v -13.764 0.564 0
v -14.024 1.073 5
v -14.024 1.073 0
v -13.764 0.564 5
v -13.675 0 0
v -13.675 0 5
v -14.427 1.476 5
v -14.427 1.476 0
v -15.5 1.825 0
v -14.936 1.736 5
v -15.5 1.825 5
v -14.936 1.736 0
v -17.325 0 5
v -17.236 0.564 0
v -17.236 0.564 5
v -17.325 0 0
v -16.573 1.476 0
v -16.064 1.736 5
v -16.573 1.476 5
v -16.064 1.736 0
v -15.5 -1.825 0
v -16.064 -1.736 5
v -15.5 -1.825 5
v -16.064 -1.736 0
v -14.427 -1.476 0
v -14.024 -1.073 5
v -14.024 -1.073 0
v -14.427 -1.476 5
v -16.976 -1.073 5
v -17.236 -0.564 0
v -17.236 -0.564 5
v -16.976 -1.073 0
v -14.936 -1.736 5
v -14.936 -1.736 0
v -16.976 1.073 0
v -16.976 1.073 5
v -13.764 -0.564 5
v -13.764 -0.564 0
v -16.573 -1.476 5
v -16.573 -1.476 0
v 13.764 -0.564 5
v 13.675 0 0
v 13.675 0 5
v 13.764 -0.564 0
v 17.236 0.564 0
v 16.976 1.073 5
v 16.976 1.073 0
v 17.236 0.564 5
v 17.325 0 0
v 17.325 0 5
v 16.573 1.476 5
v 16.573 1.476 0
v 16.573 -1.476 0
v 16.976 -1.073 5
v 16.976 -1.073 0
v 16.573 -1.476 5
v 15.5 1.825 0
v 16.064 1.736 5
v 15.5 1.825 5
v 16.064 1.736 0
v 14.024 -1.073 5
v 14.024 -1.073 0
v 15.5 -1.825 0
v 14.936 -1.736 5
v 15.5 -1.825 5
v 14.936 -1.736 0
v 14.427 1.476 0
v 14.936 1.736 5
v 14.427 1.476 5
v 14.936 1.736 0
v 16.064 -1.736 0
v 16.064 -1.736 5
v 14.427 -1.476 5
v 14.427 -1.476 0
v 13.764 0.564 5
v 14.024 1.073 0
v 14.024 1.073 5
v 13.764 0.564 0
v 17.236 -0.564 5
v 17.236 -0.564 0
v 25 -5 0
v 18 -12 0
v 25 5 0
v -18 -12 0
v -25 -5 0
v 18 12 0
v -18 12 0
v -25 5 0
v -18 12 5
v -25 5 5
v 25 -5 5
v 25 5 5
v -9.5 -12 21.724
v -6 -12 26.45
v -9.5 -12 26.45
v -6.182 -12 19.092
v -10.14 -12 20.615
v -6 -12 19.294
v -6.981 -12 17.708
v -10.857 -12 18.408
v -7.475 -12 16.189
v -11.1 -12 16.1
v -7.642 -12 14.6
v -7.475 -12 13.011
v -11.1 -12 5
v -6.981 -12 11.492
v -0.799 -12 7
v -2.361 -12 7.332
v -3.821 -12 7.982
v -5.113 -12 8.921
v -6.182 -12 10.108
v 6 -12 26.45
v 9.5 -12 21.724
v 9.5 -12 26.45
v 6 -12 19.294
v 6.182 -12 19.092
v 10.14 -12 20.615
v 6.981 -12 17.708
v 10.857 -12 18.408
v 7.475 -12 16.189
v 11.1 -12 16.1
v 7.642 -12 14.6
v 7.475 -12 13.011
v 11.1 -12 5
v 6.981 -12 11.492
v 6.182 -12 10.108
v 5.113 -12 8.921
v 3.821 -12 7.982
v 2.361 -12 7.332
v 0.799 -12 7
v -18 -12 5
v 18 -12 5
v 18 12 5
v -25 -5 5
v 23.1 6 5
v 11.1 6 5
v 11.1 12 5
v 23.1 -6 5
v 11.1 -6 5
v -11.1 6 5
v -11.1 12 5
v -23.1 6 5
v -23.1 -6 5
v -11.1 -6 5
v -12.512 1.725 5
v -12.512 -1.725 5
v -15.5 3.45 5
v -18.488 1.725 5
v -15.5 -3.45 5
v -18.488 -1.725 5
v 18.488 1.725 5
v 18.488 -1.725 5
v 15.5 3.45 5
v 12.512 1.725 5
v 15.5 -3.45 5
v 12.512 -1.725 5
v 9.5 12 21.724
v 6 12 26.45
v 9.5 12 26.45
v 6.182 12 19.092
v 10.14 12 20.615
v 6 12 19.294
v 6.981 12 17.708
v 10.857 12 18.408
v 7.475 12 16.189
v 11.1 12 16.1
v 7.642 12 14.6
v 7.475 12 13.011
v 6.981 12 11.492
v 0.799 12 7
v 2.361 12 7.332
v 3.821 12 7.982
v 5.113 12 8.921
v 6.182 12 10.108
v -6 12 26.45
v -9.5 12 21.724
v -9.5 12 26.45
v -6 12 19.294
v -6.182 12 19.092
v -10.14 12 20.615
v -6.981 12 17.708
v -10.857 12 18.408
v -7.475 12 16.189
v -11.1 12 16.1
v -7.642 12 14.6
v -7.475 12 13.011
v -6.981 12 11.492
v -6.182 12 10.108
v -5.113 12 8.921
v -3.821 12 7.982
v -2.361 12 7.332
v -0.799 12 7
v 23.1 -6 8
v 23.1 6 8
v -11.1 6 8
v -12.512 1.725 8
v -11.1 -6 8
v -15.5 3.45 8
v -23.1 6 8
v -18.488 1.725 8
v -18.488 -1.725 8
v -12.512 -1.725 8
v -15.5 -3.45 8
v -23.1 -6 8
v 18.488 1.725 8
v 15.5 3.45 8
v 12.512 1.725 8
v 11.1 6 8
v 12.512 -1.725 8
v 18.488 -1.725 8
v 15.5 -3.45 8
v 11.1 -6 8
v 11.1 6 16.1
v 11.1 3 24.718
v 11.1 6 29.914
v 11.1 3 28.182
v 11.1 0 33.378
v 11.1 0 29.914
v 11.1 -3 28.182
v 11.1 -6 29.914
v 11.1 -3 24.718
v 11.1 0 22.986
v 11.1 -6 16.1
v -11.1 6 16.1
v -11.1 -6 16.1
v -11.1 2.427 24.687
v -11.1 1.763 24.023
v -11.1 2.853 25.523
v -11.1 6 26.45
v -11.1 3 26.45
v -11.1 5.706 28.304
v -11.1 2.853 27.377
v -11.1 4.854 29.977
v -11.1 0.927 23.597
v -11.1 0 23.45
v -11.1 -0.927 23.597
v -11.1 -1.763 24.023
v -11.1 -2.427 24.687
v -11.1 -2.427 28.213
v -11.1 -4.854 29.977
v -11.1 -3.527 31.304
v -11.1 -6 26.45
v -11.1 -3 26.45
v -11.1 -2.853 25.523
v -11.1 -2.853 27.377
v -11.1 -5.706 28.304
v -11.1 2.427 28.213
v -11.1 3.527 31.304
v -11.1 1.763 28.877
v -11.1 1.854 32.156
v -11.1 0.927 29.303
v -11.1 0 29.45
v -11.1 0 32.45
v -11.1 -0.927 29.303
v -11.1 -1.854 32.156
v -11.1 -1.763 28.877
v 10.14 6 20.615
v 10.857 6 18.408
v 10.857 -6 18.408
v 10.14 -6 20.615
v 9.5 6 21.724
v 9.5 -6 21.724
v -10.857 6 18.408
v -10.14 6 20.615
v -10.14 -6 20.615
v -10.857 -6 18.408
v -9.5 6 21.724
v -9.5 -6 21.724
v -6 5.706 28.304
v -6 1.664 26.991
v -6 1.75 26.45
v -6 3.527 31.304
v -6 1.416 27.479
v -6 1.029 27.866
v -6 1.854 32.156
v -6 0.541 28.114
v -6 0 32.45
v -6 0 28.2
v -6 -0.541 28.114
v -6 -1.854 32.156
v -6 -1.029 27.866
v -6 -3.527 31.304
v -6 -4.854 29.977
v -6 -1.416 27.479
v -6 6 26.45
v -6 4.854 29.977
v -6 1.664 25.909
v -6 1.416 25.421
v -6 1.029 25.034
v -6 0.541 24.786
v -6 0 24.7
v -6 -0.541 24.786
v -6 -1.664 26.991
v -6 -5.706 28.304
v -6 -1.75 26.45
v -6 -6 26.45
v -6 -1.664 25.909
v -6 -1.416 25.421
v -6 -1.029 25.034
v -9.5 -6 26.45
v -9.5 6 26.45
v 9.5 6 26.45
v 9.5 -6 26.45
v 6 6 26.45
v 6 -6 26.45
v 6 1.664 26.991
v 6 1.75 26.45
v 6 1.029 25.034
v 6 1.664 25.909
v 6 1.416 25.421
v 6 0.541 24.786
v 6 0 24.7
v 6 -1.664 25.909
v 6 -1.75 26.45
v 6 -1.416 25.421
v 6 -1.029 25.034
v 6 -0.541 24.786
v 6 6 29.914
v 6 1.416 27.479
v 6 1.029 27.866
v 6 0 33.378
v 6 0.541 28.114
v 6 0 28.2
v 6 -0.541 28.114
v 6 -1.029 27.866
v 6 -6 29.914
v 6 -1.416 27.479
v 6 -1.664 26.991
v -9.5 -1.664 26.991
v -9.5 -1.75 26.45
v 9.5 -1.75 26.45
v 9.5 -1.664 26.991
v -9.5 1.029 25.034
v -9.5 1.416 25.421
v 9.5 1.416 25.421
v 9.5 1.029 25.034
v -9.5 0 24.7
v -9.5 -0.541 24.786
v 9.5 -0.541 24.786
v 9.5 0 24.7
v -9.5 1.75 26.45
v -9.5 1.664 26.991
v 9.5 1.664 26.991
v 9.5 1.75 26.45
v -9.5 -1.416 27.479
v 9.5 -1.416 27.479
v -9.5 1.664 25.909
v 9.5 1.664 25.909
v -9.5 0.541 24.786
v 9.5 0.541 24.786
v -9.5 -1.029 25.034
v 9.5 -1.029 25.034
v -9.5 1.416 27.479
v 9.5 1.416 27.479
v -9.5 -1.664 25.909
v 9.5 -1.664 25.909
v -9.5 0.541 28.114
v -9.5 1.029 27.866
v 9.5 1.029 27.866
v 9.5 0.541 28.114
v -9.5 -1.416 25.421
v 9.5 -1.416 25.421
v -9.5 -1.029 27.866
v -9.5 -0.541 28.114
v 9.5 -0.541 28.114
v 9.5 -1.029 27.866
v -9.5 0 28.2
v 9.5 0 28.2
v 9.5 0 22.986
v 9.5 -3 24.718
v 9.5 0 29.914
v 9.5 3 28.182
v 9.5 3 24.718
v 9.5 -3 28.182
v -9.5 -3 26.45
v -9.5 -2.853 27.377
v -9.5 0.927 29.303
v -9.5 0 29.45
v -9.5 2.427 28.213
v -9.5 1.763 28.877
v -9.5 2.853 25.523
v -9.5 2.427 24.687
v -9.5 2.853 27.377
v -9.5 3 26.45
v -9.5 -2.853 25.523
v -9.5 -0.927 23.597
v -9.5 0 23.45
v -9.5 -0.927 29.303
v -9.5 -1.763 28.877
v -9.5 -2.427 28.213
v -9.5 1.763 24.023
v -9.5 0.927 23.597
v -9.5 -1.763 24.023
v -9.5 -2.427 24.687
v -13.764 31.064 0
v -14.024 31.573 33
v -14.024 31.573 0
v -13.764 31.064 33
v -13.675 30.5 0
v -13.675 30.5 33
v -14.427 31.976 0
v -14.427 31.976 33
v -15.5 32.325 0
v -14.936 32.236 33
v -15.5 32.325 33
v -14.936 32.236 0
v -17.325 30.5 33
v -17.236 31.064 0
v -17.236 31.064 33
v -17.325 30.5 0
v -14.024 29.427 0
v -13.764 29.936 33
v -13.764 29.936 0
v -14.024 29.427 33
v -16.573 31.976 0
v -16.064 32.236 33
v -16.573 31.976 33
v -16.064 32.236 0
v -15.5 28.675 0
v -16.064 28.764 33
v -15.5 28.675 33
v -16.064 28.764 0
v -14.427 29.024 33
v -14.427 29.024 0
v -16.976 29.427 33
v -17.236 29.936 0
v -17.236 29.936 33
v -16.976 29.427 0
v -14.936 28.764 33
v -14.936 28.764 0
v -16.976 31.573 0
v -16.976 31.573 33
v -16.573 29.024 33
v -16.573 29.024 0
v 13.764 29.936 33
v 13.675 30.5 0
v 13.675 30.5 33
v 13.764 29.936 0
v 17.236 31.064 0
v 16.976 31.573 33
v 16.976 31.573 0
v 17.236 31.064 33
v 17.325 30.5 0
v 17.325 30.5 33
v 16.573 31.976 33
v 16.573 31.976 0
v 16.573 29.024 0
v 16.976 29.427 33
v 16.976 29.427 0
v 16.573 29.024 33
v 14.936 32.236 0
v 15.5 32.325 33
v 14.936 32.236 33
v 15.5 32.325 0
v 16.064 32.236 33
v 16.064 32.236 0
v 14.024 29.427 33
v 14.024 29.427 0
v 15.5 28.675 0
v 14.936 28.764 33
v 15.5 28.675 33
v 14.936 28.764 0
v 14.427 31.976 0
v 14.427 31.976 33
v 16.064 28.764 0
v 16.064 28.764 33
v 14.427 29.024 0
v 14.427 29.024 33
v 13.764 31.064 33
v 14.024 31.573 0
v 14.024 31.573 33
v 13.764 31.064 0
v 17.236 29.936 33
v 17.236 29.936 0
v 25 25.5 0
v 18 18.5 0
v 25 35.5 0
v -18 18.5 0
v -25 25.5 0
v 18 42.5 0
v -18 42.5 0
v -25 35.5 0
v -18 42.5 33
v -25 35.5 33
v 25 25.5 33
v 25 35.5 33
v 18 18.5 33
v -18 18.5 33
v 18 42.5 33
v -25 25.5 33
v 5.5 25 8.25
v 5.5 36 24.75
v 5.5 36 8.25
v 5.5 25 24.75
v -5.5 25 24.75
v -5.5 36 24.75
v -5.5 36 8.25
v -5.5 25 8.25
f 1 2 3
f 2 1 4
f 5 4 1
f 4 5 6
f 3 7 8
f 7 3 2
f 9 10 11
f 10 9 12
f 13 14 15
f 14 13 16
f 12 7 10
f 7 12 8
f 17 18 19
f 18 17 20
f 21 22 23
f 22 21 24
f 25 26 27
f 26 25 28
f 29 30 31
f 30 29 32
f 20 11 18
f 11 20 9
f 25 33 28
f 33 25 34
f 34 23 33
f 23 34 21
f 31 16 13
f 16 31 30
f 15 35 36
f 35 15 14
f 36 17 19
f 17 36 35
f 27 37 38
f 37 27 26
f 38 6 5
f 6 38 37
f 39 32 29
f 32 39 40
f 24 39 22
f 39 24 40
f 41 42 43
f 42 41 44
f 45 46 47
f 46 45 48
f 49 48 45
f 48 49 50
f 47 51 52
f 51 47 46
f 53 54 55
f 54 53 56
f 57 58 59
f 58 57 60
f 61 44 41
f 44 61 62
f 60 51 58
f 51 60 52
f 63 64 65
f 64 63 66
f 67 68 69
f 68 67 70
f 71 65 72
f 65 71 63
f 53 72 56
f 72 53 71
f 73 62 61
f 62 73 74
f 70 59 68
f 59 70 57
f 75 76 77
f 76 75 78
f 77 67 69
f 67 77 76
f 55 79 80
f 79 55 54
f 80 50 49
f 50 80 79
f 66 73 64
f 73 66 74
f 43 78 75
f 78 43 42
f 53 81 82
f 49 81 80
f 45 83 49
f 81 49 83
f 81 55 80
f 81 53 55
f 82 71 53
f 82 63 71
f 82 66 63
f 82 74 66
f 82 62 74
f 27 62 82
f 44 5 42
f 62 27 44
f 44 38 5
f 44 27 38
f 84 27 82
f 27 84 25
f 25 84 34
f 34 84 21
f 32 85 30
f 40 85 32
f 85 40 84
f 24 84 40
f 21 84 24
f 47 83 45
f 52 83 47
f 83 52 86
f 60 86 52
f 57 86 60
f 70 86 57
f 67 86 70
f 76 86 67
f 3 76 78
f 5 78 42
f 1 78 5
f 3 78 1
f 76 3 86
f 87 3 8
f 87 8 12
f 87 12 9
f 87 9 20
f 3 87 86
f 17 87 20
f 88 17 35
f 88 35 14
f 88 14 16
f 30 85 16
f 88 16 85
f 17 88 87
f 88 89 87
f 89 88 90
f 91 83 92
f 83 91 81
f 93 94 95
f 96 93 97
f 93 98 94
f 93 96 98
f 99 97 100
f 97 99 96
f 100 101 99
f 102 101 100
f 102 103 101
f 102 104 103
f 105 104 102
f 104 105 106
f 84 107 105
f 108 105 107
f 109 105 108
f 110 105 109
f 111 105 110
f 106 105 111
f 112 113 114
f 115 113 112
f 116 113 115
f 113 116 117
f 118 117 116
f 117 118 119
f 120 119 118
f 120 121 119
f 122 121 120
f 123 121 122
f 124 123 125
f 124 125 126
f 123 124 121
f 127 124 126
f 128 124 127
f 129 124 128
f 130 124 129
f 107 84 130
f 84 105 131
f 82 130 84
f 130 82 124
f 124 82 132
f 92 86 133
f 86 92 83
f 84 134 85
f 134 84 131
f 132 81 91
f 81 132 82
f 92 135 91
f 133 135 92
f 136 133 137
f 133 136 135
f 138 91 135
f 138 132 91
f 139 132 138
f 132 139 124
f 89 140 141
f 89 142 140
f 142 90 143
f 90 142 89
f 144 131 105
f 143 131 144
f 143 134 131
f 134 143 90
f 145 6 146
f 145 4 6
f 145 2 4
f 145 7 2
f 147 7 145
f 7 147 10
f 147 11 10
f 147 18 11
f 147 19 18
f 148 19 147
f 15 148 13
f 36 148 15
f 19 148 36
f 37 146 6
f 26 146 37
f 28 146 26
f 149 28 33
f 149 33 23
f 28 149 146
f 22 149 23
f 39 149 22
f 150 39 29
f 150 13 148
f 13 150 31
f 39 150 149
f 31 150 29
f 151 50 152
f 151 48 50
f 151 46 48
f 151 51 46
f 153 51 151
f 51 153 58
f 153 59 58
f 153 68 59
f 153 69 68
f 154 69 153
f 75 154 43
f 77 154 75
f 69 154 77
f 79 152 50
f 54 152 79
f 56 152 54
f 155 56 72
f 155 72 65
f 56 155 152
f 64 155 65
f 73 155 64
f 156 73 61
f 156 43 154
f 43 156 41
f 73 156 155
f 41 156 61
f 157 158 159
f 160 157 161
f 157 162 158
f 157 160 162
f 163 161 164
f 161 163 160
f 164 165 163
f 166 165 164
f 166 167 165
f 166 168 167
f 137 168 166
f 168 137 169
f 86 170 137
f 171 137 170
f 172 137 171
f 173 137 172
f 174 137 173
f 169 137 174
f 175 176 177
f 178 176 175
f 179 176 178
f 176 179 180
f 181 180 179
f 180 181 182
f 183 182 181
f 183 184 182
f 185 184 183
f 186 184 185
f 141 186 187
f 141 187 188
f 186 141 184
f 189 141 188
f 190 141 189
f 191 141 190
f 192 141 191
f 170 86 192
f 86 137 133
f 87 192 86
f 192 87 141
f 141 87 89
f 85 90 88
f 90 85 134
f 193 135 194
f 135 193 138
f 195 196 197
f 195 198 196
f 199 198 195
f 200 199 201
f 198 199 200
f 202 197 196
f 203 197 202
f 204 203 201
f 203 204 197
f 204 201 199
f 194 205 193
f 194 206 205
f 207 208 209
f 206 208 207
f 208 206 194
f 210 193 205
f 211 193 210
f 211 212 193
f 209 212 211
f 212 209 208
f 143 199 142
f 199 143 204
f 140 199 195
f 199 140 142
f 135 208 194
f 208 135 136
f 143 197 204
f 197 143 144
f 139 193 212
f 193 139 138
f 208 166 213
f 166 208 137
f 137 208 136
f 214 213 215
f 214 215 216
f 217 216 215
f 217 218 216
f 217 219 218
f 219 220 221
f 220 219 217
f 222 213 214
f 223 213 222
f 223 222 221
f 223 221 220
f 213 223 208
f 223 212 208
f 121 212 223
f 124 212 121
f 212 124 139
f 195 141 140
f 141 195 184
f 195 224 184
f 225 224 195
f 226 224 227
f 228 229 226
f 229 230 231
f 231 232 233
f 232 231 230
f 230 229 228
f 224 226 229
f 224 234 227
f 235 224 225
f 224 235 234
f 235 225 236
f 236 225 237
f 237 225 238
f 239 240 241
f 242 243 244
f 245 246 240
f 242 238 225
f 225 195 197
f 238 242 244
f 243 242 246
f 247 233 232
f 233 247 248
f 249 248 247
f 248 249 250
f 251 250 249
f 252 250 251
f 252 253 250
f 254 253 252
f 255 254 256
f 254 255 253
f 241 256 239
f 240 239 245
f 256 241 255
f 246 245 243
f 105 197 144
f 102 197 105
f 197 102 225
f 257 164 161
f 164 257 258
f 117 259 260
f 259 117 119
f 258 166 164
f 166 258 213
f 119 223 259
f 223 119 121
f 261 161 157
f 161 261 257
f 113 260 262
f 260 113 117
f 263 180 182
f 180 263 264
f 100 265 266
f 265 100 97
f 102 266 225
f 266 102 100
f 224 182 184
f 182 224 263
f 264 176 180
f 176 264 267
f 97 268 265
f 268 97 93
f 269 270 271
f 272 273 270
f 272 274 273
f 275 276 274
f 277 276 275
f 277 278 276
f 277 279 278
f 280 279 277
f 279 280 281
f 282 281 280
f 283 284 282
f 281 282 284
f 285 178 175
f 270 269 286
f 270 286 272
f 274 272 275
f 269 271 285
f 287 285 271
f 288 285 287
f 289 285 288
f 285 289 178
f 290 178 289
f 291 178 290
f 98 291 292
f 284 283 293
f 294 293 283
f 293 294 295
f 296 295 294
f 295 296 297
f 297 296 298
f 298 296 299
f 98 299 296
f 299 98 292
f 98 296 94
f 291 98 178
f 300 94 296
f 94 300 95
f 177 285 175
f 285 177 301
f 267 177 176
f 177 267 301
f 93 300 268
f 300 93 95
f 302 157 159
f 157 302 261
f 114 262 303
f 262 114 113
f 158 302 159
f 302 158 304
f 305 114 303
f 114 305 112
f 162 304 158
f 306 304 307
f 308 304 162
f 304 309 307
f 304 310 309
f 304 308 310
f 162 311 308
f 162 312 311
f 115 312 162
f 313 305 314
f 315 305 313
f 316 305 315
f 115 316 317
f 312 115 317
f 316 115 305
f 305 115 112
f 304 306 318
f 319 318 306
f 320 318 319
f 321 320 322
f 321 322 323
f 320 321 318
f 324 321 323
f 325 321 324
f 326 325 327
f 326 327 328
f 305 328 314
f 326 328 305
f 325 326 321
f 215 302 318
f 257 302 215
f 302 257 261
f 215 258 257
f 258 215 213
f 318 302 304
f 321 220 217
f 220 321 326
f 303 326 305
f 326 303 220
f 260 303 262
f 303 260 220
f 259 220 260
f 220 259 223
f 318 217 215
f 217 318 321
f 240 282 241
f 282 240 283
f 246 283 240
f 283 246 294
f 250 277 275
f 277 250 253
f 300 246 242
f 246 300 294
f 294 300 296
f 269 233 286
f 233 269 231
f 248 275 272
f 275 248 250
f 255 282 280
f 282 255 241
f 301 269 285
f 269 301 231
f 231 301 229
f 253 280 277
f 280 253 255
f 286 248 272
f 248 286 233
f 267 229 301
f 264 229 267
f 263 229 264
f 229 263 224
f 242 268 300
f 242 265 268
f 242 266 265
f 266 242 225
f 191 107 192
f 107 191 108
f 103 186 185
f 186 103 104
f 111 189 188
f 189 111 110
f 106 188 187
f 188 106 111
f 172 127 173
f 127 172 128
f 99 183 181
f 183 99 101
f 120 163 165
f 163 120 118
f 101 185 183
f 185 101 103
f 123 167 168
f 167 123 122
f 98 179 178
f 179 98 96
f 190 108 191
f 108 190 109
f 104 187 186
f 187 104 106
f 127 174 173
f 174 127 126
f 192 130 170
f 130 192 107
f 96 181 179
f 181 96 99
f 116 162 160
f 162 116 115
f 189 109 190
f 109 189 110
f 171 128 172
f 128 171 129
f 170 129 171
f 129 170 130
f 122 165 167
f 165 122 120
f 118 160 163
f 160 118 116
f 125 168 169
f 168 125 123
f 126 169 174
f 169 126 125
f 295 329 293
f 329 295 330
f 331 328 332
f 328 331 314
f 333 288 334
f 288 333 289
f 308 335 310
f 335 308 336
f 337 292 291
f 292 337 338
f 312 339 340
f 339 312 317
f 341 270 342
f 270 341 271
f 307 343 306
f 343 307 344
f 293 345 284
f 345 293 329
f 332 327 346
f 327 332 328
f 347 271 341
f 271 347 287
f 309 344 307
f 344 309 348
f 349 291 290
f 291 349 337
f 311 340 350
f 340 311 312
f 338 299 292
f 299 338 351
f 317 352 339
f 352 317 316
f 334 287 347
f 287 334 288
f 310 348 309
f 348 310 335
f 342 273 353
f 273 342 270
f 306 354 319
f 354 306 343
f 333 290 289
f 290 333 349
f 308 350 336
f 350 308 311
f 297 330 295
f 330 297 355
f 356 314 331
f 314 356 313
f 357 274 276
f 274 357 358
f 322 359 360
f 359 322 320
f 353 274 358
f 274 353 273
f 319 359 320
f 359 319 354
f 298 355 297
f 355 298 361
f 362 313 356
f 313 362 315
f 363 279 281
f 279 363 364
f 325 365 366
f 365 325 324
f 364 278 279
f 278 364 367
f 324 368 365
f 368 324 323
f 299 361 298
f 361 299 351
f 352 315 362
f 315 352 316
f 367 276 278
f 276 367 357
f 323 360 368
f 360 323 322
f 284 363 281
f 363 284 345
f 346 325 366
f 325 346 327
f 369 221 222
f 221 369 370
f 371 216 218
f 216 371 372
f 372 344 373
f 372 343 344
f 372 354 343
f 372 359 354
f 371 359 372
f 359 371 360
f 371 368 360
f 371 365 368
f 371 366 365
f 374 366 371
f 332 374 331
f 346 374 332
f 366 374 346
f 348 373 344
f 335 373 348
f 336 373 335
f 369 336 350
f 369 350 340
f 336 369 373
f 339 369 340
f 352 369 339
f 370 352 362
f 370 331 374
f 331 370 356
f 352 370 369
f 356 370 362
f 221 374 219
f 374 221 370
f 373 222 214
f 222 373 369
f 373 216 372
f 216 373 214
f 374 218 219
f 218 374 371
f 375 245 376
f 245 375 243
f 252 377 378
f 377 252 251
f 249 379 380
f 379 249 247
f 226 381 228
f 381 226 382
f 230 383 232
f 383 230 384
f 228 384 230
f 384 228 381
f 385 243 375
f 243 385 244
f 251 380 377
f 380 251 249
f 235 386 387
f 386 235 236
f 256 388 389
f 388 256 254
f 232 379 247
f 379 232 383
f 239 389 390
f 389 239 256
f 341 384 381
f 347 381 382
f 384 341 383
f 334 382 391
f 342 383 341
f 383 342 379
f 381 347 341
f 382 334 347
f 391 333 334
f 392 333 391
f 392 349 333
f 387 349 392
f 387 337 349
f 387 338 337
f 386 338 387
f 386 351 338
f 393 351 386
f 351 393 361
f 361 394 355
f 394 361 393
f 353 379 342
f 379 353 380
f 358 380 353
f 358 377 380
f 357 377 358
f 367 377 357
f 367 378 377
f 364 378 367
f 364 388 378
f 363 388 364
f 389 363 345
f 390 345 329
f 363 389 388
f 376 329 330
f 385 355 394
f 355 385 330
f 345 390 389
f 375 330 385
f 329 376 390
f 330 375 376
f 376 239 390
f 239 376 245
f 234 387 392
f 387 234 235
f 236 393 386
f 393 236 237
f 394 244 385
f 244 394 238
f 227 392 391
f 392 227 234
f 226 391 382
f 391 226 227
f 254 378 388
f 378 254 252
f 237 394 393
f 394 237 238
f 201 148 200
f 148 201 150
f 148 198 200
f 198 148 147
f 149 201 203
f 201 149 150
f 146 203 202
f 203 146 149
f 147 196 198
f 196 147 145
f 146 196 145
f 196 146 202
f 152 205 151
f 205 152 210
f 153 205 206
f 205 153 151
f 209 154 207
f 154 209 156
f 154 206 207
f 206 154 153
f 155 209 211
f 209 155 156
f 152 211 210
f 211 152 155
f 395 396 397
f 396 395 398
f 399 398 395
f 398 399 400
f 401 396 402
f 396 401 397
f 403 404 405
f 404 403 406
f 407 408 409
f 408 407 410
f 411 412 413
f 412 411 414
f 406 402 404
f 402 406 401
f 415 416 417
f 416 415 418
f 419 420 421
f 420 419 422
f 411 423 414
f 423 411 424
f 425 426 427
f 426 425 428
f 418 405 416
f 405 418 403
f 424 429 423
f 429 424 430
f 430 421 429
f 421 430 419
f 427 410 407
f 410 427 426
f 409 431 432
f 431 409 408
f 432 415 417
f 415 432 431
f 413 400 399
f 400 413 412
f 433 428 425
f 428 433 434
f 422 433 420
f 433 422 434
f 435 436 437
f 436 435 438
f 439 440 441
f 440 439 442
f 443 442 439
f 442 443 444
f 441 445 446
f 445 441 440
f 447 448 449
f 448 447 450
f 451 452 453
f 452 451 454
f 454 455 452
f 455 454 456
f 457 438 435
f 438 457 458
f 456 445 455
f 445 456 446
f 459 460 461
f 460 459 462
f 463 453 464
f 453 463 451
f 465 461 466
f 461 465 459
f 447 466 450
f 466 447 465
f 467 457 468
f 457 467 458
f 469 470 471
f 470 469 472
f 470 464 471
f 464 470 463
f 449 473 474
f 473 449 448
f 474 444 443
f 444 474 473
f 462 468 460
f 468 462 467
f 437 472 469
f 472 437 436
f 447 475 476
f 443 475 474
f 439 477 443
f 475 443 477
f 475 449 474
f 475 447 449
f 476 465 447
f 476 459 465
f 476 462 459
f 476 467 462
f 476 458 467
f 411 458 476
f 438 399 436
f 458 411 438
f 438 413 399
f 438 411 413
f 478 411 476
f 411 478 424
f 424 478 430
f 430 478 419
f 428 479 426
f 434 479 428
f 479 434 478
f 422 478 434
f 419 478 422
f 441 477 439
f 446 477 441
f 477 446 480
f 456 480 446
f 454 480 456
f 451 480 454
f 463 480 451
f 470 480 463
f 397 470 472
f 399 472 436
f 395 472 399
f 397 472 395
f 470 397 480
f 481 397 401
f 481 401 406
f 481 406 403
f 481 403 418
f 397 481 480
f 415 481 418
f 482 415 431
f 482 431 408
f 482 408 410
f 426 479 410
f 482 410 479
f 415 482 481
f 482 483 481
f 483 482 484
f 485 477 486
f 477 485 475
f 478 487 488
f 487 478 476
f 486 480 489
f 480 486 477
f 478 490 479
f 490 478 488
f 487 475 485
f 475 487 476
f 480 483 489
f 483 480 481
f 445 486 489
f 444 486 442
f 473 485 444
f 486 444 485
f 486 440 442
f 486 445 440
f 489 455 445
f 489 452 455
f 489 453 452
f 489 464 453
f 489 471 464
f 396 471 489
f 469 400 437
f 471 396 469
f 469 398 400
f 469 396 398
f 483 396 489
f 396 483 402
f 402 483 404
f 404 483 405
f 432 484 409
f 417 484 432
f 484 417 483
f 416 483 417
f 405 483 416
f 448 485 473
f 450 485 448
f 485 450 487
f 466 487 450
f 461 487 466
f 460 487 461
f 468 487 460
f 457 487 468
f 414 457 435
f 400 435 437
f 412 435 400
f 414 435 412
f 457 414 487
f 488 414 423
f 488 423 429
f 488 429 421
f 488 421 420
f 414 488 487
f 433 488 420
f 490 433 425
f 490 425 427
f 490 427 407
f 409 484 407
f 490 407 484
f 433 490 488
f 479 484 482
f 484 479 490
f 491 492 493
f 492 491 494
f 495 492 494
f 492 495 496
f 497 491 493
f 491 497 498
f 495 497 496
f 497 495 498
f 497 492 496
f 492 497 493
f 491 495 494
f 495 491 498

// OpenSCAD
// file: lm8uu-holder-slim_v1-1.scad
// LM8UU holder slim v1.1
// *********************************************
// Jonas Kühling
// http://www.jonaskuehling.de
// http://www.thingiverse.com/jonaskuehling
// *********************************************
// derived from:
// http://www.thingiverse.com/thing:14942

// LM8UU/rod dimensions
LM8UU_dia = 15.2;
LM8UU_length = 24;
rod_dia = 8;

//screw/nut dimensions (M3) - hexagon socket head cap screw ISO 4762, hexagon nut ISO 4032
screw_thread_dia_iso = 3;
screw_head_dia_iso = 5.5;
nut_wrench_size_iso = 5.5;


// screw/nut dimensions for use (plus clearance for fitting purpose)
clearance_dia = 0.5;
screw_thread_dia = screw_thread_dia_iso + clearance_dia;
screw_head_dia = screw_head_dia_iso + clearance_dia;
nut_wrench_size = nut_wrench_size_iso + clearance_dia;
nut_dia_perimeter = (nut_wrench_size/cos(30));
nut_dia = nut_dia_perimeter;
nut_surround_thickness = 3;

// main body dimensions
body_wall_thickness = 3.5;
body_width = LM8UU_dia + (2*body_wall_thickness);
body_height = body_width;
body_length = LM8UU_length;
gap_width = rod_dia + 4;
screw_bushing_space = 1;
screw_elevation = LM8UU_dia + body_wall_thickness + (screw_thread_dia/2) +screw_bushing_space;

// TEST - uncomment to render in openscad:
lm8uu_holder(1);		// WITH mountplate
// lm8uu_holder();		// WITHOUT mountplate


// nophead's polyhole module for better lm8uu-fit
module polyhole(d,h) {
    n = max(round(2 * d),3);
    rotate([0,0,180])
        cylinder(h = h, r = (d / 2) / cos (180 / n), $fn = n);
}


module mount_plate()
{
	difference()
	{
		translate([0,0,1.5])
		cube([body_width+2*screw_head_dia+4*nut_surround_thickness,screw_head_dia+2*nut_surround_thickness,3], center=true);

		for(i=[-1,1])
			translate([i*(body_width/2+nut_surround_thickness+screw_head_dia/2),0,-0.5])
				cylinder(r=screw_thread_dia/2, h=4, $fn=20);
	}
}

// main body
module lm8uu_holder(with_mountplate=false)
{
	difference()
	{
		union()
		{
			if (with_mountplate) 
			mount_plate();
	
			// body
			translate([0,0,body_height/4])
				cube([body_width,body_length,body_height/2], center=true);
			translate([0,0,(LM8UU_dia/2)+body_wall_thickness])		
				rotate([90,0,0])
					cylinder(r=(LM8UU_dia/2)+body_wall_thickness, h=LM8UU_length, center=true);
	
			// gap support
			translate([-(gap_width/2)-body_wall_thickness,-(body_length/2),body_height/2])
				cube([body_wall_thickness,LM8UU_length,(LM8UU_dia/2)+screw_bushing_space+(screw_thread_dia/2)]);
			translate([gap_width/2,-(body_length/2),body_height/2])
				cube([body_wall_thickness,LM8UU_length,(LM8UU_dia/2)+screw_bushing_space+(screw_thread_dia/2)]);
	
	
			// nut trap surround
			translate([gap_width/2,0,screw_elevation])
				rotate([0,90,0])
					cylinder(r=(((nut_wrench_size+nut_surround_thickness*2)/cos(30))/2), h=(body_width-gap_width)/2, $fn=6);
			translate([gap_width/2+(body_width-gap_width)/4,0,screw_elevation/2])
				cube([(body_width-gap_width)/2,nut_wrench_size+(nut_surround_thickness*2),screw_elevation],center=true);

			// Screw hole surround
			translate([-gap_width/2,0,screw_elevation])
				rotate([0,-90,0])
					cylinder(r=(screw_head_dia/2)+nut_surround_thickness, h=(body_width-gap_width)/2, $fn=20);
			translate([-(gap_width/2+(body_width-gap_width)/4),0,screw_elevation/2])
				cube([(body_width-gap_width)/2,screw_head_dia+(nut_surround_thickness*2),screw_elevation],center=true);
		}
	
		// bushing hole
		translate([0,0,LM8UU_dia/2+2])
			rotate([90,0,0])
//				cylinder(r=LM8UU_dia/2, h=LM8UU_length+1, center=true);
				translate([0,0,-(LM8UU_length+1)/2]) polyhole(LM8UU_dia,LM8UU_length+1);	// TESTING POLYHOLE MODULE FOR BETTER LM8UU FIT
	
		// top gap
		translate([-(gap_width/2),-(body_length/2)-1,body_height/2])
			cube([gap_width,LM8UU_length+2,(LM8UU_dia/2)+screw_bushing_space+(screw_thread_dia/2)+(nut_dia/2)+nut_surround_thickness+1]);
	
		// screw hole (one all the way through)
		translate([0,0,screw_elevation])
			rotate([0,90,0])
				cylinder(r=screw_thread_dia/2, h=body_width+3, center=true, $fn=20);
	
		// nut trap
		translate([gap_width/2+body_wall_thickness,0,screw_elevation])
			rotate([0,90,0])
				cylinder(r=nut_dia/2, h=body_width/2-gap_width/2-body_wall_thickness+1,$fn=6);
	
		// screw head hole
		translate([-(gap_width)/2-body_wall_thickness,0,screw_elevation])
			rotate([0,-90,0])
				cylinder(r=screw_head_dia/2, h=body_width/2-gap_width/2-body_wall_thickness+1,$fn=20);
	
	}
}
// main file
use <lm8uu-holder-slim_v1-1.scad>

//screw/nut dimensions (M3) - hexagon socket head cap screw ISO 4762, hexagon nut ISO 4032
screw_thread_dia_iso = 3 + 0.65;
screw_head_dia_iso = 6.35 + 0.55;
nut_wrench_size_iso = 6.35 + 0.55;
nut_height = 4.5;

// screw/nut dimensions for use (plus clearance for fitting purpose)
screw_thread_dia = screw_thread_dia_iso;
screw_head_dia = screw_head_dia_iso;
nut_wrench_size = nut_wrench_size_iso;

lm8uu_with_spacer(33);

module mount_plate(h, nutz)
{
	difference()
	{ 
		hull() {
			cube([36,24,h], center=true);
			cube([50,10,h], center=true);
		}
		for(i=[-1,1]) {
			translate([i * (15.5), 0, h / 2 - 0.1])
				cylinder(r=screw_thread_dia / 2, h=h * 2 + 0.02, center = true, $fn=20);
			if (nutz) {
				// nut trap
				translate([i * (15.5), 0, h / 2 - nut_height + 0.01])
					rotate([0, 0, 90])
						cylinder(r=nut_wrench_size / 2, h = nut_height, $fn=6);
			}
		}
	}
}

module spacer(spacer_height) {
  difference() {
    translate([0, 30.5, spacer_height / 2]) mount_plate(spacer_height, false);
	// save some material?
    translate([0, 30.5, spacer_height / 2]) cube([11, 11, spacer_height / 2], center=true);
  }
}

module lm8uu_with_spacer(spacer_height) {
  translate([0, 0, 5 / 2]) mount_plate(5, false);
  // hack - fill in lm8uu holder mount holes then punch again
difference() {
union() {
  translate([0, 0, 5]) lm8uu_holder(1);		// without mountplate
		for(i=[-1,1]) {
				translate([i * (15.5), 0, 5])
					rotate([0, 0, 90])
						cylinder(r=nut_wrench_size / 2, h = 3, $fn=20);
		}
}
		for(i=[-1,1]) {
				translate([i * (15.5), 0, 5])
				cylinder(r=screw_thread_dia / 2, h=25, center = true, $fn=20);
		}
		for(i=[-1,1]) {
			// nut trap
			translate([i * (15.5), 0, nut_height + 0.01])
				rotate([0, 0, 90])
					cylinder(r=nut_wrench_size / 2, h = nut_height, $fn=6);
		}
}
		spacer(spacer_height);
}
